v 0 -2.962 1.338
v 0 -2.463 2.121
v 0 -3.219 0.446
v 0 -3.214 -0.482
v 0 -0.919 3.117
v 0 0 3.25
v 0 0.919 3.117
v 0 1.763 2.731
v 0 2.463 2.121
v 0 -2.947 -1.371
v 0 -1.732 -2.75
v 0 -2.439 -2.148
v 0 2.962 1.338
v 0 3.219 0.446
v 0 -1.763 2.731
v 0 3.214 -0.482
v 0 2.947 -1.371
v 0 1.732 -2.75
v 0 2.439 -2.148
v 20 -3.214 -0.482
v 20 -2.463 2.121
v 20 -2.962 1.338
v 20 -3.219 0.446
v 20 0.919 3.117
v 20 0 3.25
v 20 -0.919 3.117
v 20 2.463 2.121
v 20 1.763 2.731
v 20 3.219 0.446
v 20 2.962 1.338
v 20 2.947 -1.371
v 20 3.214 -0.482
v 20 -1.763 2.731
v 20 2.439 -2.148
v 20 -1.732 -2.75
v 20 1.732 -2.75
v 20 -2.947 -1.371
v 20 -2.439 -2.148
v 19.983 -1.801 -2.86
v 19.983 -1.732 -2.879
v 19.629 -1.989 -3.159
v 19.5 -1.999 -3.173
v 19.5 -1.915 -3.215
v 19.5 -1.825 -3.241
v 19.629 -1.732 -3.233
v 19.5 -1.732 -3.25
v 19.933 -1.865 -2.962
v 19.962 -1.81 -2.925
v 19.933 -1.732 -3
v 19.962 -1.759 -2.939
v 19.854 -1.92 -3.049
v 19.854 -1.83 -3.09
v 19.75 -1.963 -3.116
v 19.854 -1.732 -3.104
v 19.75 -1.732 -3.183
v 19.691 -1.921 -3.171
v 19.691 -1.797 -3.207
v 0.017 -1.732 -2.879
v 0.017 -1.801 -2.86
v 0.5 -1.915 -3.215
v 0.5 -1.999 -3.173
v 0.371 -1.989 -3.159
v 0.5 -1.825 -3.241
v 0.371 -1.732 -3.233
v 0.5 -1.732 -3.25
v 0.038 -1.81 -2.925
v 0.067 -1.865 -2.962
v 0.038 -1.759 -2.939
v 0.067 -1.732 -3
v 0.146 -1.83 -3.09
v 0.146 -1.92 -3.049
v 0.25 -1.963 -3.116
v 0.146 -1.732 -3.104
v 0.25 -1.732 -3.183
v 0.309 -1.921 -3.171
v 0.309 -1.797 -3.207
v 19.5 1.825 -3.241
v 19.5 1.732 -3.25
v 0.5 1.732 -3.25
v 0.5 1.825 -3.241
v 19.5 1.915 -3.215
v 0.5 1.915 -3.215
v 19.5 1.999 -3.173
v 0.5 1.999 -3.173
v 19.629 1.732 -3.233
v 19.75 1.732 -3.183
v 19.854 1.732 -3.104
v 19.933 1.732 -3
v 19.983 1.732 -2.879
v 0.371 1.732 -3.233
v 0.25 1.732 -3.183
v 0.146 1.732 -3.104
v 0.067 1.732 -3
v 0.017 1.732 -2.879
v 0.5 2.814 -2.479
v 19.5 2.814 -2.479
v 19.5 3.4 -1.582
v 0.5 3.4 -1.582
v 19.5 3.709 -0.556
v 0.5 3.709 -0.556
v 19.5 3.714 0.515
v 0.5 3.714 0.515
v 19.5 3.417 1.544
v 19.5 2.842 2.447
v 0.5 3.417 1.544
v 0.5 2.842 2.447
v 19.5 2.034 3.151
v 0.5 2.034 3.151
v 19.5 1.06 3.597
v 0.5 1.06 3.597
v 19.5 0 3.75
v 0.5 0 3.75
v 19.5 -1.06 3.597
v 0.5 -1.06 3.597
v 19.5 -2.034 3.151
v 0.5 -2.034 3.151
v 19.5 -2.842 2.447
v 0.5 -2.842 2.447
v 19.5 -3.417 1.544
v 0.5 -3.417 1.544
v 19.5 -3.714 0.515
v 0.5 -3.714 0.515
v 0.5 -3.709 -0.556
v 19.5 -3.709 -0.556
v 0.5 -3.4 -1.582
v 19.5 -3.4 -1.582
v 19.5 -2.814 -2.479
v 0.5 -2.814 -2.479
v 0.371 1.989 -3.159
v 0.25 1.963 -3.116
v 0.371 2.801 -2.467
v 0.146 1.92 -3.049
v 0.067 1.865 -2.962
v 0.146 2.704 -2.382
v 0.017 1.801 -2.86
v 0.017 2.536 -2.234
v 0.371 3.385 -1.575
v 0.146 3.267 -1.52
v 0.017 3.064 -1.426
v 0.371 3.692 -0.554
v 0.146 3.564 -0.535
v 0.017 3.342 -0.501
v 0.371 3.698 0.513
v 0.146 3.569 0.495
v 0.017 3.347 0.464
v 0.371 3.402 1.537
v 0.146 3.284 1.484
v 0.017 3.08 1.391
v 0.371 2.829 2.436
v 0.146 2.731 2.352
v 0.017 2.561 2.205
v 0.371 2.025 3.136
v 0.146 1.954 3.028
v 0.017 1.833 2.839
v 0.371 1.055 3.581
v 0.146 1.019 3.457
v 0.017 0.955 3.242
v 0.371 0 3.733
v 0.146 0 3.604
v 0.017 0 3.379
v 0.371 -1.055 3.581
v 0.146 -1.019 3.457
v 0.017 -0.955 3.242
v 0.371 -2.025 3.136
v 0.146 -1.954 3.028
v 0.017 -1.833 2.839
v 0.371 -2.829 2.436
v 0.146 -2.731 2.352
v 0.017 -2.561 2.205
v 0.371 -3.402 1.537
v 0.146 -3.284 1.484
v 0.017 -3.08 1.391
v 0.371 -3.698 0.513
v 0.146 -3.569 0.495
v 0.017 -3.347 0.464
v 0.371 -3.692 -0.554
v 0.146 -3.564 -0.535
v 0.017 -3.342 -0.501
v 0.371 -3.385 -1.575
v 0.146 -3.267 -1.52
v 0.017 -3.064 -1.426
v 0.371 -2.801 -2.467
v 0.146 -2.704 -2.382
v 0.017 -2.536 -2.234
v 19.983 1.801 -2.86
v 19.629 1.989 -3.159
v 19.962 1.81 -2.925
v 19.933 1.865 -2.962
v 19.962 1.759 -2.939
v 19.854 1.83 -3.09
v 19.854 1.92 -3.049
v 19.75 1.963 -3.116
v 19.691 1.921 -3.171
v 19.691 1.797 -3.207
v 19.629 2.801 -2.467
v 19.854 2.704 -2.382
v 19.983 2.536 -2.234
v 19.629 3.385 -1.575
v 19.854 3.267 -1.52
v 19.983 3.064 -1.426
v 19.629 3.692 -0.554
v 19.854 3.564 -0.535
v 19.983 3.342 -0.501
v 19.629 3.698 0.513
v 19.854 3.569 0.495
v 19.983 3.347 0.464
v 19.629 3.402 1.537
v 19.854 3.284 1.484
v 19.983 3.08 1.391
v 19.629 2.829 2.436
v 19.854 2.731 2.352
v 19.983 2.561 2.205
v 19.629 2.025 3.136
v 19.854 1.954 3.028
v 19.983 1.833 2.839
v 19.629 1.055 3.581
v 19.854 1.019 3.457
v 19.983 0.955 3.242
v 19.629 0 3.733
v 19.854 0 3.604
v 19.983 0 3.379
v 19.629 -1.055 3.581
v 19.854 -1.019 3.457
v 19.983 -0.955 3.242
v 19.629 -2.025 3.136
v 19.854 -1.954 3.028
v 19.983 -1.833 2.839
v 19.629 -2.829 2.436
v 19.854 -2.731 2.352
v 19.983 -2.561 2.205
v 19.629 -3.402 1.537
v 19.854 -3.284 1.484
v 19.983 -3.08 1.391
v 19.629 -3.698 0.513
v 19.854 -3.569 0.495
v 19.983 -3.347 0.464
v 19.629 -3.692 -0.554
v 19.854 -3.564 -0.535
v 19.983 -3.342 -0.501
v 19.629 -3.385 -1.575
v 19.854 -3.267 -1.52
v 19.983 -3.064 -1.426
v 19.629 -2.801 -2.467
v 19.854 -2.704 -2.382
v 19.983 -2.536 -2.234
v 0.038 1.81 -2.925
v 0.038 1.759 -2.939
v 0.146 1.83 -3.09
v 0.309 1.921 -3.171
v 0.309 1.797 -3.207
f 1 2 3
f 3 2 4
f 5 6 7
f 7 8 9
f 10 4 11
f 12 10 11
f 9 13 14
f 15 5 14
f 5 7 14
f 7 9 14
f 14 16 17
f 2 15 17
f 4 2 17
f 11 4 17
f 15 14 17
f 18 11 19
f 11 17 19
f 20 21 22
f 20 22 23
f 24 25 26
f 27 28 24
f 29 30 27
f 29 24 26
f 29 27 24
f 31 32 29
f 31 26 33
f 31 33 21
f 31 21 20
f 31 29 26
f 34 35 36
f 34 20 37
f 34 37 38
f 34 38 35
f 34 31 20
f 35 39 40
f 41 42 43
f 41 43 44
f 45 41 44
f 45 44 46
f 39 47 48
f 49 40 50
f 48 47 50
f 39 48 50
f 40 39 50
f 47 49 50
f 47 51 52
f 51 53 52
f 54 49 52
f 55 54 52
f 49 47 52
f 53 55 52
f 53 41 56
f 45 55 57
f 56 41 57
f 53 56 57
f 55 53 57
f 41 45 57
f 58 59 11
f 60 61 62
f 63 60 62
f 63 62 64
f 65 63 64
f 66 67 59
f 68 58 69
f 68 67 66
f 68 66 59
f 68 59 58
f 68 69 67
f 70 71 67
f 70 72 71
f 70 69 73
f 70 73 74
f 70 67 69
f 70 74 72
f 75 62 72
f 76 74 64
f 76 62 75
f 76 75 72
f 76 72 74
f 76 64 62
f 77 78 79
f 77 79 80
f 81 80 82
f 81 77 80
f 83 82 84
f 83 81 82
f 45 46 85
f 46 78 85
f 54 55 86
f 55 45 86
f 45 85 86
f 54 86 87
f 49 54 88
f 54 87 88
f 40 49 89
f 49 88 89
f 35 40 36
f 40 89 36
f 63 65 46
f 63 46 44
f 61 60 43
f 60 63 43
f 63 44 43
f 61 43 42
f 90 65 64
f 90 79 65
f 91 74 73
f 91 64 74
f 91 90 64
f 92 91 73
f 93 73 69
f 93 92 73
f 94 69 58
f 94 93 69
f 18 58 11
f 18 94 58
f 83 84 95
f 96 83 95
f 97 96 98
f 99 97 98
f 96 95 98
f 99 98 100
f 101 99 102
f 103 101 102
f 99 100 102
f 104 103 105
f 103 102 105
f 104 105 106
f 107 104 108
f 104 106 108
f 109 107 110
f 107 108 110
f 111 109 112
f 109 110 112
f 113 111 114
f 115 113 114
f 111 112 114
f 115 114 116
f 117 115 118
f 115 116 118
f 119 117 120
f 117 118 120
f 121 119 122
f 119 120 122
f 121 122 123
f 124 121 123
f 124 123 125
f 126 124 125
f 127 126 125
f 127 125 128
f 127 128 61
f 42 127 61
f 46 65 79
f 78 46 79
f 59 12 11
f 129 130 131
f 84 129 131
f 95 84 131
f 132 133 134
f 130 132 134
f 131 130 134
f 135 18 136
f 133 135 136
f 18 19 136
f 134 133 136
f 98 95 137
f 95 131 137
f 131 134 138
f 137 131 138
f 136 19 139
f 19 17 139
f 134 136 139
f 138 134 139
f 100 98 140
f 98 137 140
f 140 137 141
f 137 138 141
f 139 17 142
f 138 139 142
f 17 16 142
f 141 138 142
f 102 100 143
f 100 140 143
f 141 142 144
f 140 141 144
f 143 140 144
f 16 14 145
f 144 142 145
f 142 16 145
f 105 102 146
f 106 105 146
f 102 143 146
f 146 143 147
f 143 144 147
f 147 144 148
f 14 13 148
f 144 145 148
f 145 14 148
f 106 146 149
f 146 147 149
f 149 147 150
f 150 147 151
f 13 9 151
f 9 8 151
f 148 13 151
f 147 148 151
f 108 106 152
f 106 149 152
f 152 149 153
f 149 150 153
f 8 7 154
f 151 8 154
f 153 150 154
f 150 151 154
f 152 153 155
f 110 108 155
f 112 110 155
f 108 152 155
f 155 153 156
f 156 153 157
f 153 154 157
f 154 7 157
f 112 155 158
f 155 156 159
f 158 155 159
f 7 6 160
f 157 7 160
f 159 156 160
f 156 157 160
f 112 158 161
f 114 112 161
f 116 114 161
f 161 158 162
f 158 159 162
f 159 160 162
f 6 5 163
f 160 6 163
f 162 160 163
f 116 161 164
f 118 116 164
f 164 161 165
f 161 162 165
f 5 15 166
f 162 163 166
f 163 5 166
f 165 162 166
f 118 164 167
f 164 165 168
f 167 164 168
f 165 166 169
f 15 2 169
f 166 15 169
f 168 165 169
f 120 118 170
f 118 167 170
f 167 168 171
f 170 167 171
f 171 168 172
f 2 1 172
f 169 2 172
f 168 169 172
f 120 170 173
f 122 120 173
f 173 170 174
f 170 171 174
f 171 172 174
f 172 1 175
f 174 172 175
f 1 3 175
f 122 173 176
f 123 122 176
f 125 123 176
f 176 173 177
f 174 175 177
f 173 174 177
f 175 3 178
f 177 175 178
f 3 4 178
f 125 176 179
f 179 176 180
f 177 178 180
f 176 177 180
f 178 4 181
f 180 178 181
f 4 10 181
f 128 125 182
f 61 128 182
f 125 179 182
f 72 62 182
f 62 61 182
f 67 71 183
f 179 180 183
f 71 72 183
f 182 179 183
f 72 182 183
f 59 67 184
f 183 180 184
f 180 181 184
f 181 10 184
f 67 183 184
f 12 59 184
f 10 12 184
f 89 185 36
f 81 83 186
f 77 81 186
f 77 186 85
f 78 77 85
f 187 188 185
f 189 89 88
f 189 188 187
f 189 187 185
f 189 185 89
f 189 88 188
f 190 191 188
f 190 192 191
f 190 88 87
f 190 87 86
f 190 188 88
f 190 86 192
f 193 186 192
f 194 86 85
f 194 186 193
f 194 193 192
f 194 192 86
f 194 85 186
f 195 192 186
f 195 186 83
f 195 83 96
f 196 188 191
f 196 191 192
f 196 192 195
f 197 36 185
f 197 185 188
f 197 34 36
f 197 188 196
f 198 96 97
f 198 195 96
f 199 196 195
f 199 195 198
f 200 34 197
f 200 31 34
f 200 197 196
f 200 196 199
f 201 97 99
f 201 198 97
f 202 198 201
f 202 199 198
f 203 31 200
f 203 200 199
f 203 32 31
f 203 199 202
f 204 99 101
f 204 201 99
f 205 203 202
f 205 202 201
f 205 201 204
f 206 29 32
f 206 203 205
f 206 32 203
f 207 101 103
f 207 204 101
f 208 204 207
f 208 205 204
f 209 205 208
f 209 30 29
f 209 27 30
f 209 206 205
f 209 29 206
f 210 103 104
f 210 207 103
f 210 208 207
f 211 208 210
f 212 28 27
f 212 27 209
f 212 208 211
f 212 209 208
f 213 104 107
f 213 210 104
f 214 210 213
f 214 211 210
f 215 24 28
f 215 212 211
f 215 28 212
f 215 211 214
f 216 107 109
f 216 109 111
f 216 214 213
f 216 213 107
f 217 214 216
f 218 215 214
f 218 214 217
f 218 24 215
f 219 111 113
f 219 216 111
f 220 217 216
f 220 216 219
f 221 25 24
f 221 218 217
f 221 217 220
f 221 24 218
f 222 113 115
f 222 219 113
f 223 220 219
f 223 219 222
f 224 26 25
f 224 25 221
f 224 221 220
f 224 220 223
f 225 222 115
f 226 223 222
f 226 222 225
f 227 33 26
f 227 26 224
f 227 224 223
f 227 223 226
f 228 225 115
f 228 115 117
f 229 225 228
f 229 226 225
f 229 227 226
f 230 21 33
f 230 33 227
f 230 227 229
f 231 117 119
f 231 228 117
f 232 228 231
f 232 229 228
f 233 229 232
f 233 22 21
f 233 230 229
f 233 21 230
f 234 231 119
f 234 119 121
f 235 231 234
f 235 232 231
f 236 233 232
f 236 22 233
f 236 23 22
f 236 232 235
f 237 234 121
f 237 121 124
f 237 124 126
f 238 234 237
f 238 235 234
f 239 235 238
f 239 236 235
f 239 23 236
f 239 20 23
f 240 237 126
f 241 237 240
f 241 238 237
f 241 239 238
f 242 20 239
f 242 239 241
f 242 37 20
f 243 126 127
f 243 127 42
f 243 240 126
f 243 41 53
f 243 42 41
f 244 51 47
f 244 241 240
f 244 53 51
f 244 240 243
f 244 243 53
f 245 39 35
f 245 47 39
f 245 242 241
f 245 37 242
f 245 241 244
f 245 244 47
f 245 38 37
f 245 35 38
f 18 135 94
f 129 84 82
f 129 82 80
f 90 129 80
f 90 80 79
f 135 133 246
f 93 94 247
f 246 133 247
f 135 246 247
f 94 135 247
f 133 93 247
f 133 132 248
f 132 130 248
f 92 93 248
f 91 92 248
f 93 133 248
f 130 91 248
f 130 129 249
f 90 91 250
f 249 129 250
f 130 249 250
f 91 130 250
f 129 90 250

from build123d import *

# Parameters (mm, degrees)
BOSS_EXTRUDE1_DEPTH = 20
FILLET1_R           = 0.5


with BuildPart() as part:
    # Sketch1 → Boss-Extrude1 (new body)
    with BuildSketch(Plane(origin=(0, 0, 0), x_dir=(0, 0, -1), z_dir=(1, 0, 0))):
        with BuildLine():
            Line((3.25, -1.870828693), (3.25, 1.870828693))
            ThreePointArc((3.25, 1.870828693), (-3.75, 0), (3.25, -1.870828693))
        make_face()
    extrude(amount=BOSS_EXTRUDE1_DEPTH)

    # Fillet1
    fillet1_edges = [part.edges().sort_by_distance(p)[0] for p in [
        (0, 0, 3.75),
        (0, 0, -3.25),
        (20, 0, -3.25),
        (10, -1.870828693, -3.25),
        (10, 1.870828693, -3.25),
        (20, 0, 3.75),
    ]]
    fillet(fillet1_edges, radius=FILLET1_R)


solid = part.part
